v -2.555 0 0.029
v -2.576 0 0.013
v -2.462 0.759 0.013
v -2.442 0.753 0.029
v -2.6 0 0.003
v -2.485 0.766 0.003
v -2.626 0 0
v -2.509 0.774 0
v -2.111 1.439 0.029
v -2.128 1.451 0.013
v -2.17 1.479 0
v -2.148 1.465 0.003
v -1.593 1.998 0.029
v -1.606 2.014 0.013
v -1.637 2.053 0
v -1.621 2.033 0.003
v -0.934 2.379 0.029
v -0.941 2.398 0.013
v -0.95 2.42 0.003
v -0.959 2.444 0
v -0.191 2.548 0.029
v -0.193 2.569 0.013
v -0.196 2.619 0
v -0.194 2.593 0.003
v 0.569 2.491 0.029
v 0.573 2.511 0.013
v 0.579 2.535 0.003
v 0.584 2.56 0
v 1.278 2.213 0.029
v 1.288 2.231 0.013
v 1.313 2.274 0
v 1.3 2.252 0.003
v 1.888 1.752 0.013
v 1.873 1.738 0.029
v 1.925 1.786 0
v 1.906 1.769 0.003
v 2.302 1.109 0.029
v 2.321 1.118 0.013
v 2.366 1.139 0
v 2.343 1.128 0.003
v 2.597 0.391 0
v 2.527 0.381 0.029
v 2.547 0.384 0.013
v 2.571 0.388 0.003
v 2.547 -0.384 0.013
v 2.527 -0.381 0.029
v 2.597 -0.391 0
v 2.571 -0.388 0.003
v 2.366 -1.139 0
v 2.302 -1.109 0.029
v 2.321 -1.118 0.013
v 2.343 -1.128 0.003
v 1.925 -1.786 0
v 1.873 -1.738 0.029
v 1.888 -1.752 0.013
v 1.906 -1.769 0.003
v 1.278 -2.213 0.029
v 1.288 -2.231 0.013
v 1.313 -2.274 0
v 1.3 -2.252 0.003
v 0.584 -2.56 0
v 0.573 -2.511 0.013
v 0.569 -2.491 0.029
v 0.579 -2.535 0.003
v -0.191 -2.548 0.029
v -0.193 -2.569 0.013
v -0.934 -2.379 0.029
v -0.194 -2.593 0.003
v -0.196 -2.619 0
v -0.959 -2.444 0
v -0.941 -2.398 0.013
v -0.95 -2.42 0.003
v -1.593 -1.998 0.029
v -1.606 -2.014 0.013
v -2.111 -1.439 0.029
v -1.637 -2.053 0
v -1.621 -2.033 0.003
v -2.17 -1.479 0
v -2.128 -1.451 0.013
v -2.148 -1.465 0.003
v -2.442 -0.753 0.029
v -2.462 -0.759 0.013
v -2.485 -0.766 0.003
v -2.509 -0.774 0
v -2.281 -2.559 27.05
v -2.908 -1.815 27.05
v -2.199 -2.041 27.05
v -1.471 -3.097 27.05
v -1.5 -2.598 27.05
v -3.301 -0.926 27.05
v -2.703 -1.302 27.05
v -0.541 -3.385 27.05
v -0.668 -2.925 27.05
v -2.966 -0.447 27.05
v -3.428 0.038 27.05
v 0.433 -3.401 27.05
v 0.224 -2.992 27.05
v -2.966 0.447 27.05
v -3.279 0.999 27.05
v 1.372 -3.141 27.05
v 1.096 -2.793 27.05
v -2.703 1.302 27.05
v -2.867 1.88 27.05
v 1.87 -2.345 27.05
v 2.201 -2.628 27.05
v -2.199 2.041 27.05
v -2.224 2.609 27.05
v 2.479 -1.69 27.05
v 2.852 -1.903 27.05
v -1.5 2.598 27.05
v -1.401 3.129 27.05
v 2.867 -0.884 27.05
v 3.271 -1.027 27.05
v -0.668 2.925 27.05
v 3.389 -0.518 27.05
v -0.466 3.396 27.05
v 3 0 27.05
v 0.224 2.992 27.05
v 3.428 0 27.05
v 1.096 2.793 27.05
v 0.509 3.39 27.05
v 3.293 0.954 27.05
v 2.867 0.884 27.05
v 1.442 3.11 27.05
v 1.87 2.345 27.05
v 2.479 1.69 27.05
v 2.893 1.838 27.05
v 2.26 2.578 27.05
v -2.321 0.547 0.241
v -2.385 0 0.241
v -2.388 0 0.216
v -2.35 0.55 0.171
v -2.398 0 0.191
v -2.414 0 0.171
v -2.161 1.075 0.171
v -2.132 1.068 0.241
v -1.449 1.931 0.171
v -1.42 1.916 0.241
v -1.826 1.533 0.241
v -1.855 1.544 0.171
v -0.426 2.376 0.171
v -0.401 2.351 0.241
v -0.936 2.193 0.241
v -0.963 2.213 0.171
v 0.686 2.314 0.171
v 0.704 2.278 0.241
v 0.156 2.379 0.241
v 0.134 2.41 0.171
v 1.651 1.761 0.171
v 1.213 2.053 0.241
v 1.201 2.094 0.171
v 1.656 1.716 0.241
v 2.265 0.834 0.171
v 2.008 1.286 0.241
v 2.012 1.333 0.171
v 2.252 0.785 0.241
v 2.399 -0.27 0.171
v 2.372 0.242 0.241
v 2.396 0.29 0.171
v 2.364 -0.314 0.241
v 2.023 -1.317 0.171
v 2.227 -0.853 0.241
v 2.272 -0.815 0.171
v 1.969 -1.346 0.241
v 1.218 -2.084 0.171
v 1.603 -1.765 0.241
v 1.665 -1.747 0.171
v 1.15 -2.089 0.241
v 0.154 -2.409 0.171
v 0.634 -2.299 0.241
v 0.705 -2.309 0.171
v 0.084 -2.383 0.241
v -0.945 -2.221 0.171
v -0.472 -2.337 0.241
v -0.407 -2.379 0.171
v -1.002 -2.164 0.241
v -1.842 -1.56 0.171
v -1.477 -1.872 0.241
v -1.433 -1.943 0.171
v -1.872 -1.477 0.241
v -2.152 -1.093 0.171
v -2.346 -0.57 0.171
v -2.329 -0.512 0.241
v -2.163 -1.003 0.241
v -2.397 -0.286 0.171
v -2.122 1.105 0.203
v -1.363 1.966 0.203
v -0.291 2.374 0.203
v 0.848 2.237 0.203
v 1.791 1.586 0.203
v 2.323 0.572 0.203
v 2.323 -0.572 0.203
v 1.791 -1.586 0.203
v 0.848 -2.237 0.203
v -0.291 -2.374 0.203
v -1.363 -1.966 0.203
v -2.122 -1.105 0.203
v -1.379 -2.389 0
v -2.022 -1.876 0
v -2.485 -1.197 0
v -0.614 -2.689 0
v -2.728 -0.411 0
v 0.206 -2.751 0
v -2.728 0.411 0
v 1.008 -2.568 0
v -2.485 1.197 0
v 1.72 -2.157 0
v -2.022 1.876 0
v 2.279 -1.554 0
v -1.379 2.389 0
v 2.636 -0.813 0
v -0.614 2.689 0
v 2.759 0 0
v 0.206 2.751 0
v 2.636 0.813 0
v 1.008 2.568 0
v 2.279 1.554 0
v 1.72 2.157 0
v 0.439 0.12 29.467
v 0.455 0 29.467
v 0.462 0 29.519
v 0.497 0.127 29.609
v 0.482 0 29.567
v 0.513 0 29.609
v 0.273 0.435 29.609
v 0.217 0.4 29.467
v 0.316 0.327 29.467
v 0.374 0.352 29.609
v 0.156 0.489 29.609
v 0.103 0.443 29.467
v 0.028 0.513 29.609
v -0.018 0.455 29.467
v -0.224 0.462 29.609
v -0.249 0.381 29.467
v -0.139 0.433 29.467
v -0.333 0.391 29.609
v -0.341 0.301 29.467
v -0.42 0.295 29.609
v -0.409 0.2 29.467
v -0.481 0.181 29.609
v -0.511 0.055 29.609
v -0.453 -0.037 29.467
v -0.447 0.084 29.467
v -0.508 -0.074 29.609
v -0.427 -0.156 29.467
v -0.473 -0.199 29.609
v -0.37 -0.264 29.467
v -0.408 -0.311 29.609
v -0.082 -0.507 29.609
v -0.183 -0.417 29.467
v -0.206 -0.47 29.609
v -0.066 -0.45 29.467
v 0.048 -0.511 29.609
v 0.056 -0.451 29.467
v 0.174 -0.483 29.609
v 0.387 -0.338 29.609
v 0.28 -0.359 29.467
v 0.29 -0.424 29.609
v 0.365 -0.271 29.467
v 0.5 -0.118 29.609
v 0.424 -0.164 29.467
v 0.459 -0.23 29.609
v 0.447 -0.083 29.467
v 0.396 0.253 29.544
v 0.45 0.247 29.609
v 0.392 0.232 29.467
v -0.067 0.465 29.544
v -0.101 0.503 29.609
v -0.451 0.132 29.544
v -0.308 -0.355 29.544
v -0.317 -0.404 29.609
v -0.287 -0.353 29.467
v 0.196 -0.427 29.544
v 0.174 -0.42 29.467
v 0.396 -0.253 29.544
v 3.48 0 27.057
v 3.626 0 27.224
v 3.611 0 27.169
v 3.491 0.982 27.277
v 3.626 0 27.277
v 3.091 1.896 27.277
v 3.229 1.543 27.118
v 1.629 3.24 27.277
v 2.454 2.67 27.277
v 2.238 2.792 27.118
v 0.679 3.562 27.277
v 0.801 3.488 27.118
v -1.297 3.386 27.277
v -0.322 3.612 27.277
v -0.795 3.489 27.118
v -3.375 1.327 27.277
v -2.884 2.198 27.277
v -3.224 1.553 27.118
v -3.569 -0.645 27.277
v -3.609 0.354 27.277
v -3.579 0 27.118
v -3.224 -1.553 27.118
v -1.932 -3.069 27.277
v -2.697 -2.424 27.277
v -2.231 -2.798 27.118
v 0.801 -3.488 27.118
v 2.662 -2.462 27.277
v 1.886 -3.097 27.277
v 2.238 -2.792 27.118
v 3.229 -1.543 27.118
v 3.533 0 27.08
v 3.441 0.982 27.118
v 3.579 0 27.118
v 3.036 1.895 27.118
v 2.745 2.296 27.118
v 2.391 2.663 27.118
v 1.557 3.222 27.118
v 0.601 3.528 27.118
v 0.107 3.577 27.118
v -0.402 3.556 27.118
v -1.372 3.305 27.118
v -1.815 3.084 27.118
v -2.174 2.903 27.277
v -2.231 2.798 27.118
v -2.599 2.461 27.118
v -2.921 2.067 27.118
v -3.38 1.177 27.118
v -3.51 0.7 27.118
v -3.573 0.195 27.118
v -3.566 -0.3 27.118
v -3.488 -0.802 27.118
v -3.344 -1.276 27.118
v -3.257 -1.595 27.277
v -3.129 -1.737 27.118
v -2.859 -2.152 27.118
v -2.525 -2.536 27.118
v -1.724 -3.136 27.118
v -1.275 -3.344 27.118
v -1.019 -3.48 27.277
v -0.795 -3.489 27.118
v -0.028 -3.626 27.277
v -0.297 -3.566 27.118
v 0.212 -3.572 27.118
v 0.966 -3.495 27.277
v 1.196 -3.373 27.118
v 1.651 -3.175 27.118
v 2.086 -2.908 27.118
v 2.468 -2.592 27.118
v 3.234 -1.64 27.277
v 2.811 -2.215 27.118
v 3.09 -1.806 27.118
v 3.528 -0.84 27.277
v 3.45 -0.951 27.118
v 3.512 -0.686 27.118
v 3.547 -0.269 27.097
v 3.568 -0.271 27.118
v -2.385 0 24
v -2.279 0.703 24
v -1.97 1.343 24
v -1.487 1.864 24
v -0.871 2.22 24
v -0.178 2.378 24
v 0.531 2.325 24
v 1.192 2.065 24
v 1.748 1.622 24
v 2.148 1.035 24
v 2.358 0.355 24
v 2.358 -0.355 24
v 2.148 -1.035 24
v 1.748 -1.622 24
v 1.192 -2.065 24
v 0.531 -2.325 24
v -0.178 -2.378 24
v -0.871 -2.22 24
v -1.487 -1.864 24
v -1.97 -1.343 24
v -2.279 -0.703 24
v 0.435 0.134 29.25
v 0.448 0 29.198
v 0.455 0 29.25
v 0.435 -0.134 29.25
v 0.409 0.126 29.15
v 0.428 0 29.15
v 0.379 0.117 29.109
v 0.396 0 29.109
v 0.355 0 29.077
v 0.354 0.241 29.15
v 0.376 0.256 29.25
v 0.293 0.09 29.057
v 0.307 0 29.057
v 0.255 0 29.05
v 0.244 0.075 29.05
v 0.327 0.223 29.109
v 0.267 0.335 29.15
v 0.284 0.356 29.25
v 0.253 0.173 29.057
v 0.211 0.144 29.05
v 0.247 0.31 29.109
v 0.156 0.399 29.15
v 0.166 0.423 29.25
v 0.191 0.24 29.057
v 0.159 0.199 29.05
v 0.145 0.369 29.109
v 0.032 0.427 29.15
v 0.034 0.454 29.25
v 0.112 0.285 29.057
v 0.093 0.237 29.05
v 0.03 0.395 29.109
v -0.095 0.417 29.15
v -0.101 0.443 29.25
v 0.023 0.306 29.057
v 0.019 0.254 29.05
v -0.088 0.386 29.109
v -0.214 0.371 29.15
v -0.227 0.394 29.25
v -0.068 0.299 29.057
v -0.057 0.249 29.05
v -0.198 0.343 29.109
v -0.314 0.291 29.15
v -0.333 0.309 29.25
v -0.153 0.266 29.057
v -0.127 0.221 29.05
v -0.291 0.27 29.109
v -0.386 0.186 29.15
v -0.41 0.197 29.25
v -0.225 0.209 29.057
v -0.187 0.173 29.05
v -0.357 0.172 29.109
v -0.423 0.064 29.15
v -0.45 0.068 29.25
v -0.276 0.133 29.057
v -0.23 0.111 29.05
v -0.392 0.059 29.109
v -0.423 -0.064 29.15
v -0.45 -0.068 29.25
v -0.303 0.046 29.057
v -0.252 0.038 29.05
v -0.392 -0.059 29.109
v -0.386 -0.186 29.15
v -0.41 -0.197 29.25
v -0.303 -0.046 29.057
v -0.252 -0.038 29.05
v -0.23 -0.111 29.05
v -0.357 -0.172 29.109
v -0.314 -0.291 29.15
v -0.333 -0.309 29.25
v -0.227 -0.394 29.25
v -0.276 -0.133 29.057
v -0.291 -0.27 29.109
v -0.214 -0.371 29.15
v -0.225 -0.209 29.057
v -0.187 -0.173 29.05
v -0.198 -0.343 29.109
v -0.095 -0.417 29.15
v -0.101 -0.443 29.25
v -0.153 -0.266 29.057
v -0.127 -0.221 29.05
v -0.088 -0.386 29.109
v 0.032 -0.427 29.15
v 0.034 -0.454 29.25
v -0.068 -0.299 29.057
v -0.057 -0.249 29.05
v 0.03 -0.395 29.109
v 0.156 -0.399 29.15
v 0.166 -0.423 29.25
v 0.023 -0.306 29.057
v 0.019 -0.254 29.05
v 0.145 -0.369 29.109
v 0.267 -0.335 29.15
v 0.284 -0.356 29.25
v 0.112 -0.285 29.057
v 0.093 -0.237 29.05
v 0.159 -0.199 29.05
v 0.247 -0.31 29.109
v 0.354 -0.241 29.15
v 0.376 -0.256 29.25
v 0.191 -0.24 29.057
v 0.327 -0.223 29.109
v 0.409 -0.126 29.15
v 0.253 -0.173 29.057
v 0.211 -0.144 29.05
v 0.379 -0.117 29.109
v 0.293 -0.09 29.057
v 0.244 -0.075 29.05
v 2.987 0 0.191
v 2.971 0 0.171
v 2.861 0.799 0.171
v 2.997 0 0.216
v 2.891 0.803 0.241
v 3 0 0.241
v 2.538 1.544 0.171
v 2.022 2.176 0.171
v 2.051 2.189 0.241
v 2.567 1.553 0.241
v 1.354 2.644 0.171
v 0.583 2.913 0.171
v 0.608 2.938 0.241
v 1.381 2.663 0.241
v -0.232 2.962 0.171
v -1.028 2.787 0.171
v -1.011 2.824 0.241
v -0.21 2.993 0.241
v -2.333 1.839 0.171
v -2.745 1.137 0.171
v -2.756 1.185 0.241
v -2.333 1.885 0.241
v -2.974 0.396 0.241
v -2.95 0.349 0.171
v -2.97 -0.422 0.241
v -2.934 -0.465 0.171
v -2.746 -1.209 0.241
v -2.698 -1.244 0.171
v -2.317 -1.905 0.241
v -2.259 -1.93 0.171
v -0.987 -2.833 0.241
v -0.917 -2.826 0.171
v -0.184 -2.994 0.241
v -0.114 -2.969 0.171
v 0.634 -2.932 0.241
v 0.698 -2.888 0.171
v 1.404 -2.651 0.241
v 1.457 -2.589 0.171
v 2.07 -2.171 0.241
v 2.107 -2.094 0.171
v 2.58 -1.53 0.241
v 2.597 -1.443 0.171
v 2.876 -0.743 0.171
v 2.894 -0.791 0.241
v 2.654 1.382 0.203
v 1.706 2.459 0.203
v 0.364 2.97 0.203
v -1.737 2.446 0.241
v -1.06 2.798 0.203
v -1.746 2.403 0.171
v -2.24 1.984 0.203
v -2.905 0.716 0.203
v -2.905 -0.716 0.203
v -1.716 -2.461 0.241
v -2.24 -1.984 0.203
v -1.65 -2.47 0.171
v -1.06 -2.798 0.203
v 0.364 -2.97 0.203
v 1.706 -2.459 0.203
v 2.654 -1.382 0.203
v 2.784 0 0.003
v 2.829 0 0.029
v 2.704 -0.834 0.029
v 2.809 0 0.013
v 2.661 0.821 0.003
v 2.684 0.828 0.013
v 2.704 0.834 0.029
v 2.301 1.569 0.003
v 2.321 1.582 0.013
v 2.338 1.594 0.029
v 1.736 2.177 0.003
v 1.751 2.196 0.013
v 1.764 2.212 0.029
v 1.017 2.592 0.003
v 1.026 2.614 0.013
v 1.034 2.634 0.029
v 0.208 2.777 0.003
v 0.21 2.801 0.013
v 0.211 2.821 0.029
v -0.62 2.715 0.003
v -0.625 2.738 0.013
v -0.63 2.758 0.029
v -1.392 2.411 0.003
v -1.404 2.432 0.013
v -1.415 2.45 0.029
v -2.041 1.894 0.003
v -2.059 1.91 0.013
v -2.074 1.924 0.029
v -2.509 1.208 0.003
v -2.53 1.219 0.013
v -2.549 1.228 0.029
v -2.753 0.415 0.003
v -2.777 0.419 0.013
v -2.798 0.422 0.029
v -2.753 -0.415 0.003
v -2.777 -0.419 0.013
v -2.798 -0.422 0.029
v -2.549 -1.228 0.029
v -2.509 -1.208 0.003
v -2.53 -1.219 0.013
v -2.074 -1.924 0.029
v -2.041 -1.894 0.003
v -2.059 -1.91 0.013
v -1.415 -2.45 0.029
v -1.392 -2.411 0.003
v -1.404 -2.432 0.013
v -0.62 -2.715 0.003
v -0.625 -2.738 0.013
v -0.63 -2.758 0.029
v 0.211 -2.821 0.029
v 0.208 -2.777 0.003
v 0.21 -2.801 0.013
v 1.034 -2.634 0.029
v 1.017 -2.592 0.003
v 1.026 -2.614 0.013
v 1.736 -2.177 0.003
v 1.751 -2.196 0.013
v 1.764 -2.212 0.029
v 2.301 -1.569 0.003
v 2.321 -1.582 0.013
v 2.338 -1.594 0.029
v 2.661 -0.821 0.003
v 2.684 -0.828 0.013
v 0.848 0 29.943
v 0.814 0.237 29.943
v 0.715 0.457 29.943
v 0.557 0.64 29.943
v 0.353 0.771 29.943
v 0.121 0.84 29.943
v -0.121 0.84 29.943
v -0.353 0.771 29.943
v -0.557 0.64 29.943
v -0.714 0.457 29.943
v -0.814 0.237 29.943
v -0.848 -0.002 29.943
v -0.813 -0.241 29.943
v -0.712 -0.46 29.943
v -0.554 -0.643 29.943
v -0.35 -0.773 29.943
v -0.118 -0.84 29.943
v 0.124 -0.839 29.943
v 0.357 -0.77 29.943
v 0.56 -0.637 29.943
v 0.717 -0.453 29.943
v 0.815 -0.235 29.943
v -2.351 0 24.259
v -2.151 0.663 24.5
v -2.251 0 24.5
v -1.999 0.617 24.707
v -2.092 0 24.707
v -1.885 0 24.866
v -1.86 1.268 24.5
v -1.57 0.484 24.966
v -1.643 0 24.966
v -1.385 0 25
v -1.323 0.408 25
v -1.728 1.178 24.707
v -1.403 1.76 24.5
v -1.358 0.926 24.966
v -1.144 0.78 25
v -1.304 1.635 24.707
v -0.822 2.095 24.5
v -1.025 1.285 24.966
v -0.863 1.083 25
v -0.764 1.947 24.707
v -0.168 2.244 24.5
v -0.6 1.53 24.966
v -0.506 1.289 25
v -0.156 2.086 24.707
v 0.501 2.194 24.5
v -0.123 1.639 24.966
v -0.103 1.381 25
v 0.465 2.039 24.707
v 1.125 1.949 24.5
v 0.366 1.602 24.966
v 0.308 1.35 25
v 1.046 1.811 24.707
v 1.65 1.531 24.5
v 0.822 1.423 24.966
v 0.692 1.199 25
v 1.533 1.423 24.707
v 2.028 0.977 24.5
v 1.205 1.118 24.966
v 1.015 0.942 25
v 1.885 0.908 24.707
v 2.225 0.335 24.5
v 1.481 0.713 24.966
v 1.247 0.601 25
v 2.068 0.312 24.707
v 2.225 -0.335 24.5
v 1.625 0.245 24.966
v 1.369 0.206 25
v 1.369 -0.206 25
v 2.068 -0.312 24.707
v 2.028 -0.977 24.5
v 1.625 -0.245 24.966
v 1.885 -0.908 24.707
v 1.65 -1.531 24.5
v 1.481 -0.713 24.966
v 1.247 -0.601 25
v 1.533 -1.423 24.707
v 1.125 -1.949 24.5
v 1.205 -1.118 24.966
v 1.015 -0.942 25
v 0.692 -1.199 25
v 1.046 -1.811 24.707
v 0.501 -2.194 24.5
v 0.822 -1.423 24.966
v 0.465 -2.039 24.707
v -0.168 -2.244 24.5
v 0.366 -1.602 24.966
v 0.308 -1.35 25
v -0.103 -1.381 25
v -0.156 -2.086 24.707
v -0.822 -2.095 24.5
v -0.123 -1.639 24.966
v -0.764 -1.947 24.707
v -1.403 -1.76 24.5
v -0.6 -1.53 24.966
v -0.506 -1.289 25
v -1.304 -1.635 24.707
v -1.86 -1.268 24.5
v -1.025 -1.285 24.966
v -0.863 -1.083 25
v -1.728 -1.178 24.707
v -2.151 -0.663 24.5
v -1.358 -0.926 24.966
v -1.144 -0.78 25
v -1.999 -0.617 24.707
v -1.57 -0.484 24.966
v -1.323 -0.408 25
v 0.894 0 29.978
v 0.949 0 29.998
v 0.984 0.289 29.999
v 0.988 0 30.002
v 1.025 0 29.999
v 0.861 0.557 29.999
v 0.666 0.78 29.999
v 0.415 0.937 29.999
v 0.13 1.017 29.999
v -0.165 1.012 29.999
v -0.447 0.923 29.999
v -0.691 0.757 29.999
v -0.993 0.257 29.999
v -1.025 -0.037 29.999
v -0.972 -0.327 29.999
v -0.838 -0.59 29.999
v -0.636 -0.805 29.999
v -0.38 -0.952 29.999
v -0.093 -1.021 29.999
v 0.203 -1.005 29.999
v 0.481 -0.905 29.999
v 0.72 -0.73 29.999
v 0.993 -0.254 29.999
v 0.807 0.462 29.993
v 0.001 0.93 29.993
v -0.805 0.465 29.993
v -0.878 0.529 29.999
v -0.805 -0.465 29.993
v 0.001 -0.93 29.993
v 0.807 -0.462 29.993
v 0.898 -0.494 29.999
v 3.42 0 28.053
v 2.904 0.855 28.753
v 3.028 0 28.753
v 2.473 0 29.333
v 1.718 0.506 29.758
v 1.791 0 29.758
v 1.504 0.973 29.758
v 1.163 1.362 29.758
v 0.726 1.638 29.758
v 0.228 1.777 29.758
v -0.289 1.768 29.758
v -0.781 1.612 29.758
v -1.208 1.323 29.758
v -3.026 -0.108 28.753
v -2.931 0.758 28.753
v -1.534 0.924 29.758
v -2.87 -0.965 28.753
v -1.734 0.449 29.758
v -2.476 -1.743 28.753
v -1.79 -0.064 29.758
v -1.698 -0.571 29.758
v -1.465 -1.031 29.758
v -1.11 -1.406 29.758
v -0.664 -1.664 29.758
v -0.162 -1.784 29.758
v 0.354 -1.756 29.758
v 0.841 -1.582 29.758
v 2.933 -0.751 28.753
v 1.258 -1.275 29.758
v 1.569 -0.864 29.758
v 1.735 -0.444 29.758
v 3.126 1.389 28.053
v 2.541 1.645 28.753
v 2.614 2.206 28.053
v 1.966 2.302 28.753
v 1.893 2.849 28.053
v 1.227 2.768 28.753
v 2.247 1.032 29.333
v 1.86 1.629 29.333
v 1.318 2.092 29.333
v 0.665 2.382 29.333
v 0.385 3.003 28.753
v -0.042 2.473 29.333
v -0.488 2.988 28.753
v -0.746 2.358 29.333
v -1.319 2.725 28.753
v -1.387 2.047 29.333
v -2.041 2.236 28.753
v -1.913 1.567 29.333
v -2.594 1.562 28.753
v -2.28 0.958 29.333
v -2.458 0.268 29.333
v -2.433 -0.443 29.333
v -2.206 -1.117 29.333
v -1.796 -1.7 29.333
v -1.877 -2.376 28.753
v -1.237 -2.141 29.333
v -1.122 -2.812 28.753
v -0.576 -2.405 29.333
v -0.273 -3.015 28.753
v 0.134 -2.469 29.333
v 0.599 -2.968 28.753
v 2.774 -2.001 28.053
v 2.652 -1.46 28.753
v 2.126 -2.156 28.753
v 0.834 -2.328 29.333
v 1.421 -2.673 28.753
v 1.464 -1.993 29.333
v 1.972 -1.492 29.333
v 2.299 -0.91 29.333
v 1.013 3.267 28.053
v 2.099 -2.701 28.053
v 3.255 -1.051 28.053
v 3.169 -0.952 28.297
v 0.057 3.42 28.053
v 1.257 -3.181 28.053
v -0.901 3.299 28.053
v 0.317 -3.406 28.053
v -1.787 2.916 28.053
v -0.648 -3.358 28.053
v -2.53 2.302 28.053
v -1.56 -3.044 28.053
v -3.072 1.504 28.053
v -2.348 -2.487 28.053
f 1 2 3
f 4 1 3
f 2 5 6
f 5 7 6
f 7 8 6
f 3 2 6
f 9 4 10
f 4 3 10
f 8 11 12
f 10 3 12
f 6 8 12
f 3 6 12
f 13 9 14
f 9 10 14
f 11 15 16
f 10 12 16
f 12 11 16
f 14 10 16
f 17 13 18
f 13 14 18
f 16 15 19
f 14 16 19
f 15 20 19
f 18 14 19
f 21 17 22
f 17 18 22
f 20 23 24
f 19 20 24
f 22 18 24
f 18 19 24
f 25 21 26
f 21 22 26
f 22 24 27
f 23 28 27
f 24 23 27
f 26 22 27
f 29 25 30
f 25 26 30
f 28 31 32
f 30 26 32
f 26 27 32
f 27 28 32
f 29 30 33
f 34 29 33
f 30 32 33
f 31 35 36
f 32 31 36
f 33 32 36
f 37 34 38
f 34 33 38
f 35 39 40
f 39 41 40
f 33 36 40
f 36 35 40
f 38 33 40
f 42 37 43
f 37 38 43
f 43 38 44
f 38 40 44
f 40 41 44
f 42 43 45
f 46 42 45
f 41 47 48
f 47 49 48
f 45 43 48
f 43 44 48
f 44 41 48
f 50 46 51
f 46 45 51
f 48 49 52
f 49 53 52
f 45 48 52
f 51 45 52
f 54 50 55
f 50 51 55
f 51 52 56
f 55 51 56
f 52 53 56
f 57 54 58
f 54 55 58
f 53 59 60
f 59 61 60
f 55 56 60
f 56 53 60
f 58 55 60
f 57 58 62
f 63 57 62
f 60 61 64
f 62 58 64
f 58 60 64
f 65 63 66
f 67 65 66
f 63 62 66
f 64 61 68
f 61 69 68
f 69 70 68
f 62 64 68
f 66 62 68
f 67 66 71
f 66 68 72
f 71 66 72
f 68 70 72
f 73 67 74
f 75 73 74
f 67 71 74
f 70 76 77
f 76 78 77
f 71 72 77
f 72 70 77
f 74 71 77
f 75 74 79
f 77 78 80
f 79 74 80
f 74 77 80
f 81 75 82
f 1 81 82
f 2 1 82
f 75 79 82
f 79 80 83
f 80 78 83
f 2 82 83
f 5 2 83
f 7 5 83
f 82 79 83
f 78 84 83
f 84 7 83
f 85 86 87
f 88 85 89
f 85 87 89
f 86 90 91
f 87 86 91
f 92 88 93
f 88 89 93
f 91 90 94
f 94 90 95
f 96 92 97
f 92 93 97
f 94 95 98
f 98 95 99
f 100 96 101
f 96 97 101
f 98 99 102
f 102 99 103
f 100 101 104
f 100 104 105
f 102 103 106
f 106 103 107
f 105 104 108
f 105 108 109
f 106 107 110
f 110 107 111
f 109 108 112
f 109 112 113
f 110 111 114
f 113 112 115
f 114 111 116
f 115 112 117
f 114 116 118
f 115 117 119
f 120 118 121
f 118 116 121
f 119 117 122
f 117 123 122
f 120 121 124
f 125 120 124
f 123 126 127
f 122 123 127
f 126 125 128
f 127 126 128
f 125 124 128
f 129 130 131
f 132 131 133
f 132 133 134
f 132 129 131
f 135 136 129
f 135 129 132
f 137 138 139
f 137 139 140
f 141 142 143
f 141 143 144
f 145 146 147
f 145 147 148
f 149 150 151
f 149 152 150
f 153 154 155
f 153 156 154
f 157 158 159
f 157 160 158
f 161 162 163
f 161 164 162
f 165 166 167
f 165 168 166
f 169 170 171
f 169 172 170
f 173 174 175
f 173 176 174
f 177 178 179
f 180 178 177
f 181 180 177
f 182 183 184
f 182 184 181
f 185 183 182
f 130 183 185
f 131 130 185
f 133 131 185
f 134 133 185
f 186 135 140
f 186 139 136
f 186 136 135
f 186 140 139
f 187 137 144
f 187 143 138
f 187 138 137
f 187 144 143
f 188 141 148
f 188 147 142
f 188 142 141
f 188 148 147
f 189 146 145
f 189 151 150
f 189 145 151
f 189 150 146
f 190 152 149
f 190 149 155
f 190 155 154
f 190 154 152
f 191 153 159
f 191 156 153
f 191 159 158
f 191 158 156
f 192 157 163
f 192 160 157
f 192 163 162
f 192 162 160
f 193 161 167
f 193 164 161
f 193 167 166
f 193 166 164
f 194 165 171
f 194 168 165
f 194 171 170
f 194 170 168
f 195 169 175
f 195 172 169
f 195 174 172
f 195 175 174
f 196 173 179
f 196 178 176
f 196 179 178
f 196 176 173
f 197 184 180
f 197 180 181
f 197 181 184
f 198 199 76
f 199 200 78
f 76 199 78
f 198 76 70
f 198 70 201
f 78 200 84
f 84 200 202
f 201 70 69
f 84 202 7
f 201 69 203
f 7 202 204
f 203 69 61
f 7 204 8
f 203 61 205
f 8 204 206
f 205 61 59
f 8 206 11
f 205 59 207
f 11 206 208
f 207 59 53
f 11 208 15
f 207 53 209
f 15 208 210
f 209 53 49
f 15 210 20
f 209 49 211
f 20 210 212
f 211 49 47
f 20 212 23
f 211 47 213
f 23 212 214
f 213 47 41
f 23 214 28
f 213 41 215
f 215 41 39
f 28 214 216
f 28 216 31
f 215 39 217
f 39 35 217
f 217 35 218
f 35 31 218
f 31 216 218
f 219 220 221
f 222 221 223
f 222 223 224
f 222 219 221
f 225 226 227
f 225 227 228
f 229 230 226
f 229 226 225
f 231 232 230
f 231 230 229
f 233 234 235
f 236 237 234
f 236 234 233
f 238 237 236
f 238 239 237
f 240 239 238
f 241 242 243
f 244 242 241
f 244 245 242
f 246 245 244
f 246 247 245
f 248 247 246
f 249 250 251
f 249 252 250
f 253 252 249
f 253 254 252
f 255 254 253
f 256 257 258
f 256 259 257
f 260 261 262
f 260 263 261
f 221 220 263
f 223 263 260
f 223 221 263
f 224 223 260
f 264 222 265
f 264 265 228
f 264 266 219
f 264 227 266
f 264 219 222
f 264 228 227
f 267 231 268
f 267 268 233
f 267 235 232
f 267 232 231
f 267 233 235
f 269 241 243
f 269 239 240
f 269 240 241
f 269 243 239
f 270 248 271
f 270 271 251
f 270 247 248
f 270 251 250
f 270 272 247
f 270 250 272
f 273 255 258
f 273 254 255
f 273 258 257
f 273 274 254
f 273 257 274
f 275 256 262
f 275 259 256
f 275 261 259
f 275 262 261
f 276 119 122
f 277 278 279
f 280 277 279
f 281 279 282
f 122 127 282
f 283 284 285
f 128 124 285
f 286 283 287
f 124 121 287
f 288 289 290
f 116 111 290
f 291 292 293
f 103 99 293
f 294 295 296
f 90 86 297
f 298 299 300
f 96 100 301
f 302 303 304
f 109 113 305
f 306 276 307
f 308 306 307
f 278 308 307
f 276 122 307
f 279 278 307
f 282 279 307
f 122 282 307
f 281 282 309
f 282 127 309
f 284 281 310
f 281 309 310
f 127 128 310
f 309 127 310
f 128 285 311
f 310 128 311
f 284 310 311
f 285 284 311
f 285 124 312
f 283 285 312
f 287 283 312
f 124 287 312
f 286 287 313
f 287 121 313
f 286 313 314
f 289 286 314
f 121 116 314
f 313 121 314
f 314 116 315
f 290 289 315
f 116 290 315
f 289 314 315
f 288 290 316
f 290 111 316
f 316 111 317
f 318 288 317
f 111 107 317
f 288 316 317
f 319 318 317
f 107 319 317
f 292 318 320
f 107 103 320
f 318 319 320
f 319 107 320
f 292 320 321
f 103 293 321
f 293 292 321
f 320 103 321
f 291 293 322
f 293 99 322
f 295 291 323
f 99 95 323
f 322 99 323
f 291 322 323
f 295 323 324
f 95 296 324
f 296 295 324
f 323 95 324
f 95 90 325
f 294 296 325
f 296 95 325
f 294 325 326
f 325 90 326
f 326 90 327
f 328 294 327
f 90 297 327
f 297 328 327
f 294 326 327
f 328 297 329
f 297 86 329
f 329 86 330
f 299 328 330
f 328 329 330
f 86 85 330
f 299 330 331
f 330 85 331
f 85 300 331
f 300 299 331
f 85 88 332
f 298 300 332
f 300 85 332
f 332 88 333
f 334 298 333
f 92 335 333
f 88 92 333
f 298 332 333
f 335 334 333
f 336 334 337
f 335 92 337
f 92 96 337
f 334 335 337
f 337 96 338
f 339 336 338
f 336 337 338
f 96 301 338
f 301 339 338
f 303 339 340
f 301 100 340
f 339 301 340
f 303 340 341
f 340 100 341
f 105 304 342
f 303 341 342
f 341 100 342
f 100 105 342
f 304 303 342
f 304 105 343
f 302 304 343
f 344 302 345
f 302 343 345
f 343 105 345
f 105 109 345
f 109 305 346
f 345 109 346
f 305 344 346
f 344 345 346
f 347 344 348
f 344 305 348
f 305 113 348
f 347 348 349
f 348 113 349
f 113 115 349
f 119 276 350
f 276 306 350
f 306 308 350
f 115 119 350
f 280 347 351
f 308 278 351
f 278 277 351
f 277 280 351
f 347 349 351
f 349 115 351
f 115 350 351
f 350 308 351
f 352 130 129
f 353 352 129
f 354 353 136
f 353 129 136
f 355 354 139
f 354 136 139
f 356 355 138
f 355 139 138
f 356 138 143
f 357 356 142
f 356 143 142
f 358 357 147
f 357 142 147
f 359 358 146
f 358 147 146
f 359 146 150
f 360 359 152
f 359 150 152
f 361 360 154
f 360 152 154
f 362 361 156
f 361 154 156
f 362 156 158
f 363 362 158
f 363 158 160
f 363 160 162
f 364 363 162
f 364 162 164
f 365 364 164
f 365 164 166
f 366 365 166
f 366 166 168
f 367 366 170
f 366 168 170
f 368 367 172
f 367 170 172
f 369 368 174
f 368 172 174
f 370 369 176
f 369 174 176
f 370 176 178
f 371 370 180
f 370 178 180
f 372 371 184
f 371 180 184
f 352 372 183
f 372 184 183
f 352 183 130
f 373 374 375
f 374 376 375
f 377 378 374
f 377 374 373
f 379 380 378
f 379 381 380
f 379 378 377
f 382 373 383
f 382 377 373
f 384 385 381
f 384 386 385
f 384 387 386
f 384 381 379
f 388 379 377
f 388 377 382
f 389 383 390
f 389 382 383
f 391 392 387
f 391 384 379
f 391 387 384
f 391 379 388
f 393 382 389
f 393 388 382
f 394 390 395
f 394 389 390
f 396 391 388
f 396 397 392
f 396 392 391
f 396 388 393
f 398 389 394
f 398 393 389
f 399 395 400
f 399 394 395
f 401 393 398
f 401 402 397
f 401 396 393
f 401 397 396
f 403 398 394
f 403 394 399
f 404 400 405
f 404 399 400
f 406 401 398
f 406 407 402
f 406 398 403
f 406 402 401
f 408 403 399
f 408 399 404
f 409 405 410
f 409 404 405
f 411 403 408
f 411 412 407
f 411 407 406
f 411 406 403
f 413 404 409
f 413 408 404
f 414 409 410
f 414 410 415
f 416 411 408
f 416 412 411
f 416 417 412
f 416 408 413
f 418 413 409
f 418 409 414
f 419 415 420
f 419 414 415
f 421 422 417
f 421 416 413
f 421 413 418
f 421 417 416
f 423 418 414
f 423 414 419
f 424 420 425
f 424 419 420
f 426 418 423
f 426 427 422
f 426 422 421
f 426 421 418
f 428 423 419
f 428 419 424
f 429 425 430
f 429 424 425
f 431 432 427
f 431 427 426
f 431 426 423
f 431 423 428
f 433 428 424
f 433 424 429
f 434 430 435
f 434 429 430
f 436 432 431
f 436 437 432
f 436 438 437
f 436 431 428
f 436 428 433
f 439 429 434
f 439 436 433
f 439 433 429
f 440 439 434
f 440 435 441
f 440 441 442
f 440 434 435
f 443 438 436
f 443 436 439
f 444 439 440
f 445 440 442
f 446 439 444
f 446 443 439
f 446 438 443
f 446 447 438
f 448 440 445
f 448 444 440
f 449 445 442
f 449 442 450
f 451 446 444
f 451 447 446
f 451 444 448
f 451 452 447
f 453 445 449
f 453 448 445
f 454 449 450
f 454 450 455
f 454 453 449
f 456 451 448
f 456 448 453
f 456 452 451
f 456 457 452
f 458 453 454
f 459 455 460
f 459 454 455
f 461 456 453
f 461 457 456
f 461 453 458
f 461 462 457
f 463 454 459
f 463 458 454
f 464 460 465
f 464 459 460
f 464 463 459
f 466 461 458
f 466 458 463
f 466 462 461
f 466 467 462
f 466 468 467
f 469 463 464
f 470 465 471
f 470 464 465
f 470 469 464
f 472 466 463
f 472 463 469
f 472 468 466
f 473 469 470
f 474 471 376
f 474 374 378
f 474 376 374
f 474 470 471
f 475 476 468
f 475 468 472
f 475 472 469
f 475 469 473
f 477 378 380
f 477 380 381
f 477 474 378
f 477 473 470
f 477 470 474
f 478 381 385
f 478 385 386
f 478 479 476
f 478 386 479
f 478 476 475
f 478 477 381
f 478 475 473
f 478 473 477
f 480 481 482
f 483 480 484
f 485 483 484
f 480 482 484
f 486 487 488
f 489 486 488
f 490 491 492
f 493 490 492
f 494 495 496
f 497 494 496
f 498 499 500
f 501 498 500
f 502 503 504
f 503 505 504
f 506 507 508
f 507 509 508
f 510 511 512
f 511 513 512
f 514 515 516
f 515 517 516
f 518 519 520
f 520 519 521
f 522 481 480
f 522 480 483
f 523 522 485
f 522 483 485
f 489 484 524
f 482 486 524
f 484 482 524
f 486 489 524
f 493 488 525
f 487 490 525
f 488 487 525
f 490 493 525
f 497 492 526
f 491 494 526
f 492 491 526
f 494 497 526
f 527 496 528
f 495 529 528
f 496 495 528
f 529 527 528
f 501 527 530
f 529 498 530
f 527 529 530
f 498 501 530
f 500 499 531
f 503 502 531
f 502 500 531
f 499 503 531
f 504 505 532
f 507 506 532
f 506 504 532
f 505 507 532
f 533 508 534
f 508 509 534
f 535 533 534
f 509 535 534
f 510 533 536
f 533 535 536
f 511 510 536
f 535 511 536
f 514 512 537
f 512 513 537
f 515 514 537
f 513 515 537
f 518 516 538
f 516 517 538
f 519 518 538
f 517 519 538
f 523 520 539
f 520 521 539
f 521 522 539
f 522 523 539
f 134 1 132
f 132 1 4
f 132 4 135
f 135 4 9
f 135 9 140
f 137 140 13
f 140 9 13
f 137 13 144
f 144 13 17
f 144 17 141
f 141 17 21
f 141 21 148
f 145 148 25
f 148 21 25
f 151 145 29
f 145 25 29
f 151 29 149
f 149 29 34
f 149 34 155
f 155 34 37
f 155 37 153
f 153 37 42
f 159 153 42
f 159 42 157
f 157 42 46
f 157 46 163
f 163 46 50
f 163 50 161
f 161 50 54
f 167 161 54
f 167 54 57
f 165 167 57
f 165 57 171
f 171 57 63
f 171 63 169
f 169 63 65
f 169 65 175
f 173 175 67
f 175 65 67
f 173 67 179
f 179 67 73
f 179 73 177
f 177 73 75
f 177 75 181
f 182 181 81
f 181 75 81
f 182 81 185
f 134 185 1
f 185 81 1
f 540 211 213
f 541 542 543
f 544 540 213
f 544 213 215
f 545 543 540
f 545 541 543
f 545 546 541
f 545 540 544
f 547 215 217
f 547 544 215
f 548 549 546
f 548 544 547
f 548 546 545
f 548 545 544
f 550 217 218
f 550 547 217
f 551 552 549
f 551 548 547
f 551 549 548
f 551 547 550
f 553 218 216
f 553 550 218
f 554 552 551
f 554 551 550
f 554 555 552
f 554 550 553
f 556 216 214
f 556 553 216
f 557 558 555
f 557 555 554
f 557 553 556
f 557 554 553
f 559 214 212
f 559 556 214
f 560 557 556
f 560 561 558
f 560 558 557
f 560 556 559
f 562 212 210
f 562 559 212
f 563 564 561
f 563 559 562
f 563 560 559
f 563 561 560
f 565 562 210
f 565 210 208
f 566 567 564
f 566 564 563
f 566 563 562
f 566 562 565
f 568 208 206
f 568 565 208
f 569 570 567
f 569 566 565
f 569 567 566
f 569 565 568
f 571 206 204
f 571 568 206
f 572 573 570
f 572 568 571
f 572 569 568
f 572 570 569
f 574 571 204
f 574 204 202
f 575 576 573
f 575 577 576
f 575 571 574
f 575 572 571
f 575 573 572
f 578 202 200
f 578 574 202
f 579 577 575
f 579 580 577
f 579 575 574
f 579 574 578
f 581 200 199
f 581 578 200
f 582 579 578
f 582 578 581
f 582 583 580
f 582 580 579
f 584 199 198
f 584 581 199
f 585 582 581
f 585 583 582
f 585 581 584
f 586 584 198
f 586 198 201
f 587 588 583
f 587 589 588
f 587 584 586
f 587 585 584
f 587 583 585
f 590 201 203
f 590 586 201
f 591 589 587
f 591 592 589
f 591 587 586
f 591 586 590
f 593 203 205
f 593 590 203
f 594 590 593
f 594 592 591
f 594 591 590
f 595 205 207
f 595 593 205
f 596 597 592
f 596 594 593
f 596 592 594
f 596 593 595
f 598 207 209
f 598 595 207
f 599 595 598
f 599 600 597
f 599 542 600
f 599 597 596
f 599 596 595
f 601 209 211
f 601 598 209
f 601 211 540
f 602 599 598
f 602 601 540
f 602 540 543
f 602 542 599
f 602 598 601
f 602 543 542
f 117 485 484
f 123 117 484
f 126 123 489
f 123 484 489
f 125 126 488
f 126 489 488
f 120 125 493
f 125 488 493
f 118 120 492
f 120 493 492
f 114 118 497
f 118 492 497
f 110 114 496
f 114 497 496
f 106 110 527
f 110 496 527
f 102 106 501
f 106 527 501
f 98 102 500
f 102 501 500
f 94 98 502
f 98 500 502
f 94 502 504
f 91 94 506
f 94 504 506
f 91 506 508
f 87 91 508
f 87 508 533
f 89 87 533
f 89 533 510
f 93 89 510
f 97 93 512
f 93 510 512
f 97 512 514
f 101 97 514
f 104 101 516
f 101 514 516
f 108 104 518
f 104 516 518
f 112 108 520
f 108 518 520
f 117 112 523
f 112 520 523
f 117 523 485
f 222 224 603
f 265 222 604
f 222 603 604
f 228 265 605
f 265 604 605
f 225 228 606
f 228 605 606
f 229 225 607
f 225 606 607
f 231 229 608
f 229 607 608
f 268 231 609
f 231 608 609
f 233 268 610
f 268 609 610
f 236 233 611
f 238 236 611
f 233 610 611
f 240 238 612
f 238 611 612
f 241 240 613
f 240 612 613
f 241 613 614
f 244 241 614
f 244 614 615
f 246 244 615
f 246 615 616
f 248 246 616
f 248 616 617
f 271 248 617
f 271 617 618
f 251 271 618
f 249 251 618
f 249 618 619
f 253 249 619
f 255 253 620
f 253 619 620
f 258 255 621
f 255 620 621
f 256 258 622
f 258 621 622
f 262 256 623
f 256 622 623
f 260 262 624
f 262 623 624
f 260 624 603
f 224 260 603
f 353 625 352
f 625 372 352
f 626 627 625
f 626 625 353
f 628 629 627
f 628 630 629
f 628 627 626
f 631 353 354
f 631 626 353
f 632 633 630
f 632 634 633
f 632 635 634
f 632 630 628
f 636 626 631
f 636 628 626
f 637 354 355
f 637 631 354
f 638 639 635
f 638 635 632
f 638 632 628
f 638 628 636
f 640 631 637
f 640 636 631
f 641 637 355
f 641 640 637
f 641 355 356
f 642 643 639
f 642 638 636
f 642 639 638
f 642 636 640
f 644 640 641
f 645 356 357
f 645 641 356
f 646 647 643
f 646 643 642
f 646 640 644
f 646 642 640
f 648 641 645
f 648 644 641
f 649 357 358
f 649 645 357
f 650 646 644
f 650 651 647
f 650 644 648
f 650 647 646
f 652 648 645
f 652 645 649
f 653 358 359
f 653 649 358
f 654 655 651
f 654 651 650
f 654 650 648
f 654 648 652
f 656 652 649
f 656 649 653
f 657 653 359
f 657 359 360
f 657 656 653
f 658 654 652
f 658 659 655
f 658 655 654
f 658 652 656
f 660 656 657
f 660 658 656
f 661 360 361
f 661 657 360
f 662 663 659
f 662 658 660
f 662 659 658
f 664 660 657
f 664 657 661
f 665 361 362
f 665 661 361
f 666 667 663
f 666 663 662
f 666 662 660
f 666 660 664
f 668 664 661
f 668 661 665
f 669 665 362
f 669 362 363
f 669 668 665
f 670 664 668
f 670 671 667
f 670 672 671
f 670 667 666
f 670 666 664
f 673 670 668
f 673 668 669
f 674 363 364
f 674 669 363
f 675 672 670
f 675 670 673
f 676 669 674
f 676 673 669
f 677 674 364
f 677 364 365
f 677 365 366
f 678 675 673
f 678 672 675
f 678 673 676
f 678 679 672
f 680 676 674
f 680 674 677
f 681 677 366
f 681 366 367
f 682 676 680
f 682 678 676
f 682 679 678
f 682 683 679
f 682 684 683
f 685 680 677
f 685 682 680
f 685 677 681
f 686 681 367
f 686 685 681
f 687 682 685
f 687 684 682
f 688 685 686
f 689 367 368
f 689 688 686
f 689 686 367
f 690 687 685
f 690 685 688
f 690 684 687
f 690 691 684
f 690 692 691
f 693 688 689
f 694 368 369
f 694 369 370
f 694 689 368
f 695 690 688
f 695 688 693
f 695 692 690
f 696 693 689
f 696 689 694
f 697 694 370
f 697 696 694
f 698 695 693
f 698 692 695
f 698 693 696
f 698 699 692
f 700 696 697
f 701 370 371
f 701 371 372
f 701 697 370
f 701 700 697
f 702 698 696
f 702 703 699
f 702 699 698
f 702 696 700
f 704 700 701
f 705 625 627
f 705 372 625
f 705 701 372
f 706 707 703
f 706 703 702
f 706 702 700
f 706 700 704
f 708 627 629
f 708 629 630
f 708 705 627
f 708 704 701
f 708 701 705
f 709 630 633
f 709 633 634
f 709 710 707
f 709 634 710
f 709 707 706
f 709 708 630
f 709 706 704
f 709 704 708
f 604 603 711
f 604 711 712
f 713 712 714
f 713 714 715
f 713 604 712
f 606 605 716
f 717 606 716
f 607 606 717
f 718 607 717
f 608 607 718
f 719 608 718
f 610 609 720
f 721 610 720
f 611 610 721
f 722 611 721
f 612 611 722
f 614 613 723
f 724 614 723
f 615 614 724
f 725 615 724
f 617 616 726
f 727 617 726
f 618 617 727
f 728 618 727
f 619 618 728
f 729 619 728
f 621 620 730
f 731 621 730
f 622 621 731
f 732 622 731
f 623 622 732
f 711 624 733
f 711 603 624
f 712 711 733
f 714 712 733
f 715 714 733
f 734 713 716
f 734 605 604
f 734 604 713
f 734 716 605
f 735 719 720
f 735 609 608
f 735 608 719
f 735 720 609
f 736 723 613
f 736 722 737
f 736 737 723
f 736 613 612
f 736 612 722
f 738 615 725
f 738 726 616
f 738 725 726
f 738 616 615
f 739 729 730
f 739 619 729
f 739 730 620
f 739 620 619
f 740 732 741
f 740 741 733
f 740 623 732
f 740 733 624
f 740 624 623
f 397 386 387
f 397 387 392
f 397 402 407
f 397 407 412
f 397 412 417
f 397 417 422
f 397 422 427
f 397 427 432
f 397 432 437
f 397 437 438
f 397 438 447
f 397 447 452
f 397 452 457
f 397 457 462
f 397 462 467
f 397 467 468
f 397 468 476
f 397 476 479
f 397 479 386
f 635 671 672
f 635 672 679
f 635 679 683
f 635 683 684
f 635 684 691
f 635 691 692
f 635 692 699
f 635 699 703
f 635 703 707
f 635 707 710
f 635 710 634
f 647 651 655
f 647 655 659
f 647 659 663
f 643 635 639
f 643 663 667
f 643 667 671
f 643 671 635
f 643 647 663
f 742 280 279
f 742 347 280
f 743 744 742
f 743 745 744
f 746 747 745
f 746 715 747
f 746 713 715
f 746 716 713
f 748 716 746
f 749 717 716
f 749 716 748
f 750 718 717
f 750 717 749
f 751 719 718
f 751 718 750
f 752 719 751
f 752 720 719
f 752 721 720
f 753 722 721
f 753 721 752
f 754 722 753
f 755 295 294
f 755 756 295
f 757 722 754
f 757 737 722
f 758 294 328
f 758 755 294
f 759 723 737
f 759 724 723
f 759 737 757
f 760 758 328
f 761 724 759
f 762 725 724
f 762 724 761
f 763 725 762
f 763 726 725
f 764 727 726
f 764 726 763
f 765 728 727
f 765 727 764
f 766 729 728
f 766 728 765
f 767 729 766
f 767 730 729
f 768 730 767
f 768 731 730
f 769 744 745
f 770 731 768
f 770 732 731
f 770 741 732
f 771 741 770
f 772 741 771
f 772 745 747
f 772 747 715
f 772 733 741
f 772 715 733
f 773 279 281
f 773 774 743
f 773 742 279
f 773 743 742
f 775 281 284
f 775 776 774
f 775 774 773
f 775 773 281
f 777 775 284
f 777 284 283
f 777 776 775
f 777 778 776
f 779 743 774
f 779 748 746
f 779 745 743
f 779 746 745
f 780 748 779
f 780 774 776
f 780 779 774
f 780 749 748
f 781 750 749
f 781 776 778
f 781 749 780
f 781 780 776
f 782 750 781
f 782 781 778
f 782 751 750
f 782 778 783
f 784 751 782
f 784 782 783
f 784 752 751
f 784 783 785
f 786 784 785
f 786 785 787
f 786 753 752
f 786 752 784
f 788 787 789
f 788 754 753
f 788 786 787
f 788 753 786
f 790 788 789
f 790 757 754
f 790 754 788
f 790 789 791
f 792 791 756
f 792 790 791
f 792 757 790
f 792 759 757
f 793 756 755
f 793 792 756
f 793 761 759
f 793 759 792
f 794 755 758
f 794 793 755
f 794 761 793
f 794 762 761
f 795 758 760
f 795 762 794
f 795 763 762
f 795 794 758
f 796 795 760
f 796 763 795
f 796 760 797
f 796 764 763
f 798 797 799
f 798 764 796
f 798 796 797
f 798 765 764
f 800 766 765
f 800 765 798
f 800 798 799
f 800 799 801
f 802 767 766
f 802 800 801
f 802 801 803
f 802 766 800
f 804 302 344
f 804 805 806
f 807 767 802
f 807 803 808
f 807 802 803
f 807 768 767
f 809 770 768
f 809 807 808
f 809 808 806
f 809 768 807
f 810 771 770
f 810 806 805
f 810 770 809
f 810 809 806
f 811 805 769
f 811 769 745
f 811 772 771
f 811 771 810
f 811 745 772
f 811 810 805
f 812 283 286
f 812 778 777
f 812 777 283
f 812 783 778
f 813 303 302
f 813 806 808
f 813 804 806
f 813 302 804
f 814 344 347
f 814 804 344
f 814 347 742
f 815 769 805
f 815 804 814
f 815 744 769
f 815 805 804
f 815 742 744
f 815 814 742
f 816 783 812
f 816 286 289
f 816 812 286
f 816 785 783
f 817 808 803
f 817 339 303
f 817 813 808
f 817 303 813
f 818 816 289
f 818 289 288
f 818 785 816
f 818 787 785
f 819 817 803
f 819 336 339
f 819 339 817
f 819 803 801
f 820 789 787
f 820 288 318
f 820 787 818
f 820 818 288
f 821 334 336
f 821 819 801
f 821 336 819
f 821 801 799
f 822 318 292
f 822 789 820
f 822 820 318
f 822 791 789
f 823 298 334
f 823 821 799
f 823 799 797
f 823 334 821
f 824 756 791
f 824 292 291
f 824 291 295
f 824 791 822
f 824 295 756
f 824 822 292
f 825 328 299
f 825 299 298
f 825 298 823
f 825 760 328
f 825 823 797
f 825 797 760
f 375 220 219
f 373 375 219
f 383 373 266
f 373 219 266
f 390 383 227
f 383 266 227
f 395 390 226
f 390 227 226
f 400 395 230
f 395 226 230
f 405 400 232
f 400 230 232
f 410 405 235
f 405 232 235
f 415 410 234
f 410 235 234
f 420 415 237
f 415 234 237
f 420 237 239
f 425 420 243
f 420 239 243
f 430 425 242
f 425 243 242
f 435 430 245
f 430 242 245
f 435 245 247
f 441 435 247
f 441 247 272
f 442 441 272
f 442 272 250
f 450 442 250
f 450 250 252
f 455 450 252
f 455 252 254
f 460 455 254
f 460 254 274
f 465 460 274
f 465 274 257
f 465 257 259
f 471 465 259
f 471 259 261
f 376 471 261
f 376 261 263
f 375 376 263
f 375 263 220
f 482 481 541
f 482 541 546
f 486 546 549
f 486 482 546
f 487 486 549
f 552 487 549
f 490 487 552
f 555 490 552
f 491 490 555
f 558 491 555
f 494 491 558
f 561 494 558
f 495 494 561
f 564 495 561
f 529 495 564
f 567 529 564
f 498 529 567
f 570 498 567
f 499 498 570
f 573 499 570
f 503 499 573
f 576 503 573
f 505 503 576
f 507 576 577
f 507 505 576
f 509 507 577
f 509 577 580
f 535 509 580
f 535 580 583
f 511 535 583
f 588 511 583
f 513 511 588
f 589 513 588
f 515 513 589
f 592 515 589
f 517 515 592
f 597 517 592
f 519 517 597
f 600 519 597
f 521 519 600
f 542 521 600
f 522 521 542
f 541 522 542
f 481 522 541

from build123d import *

# Parameters (mm, degrees)
SKETCH1_R           = 3
BOSS_EXTRUDE1_DEPTH = 27.05
SKETCH2_R           = 3.648644993
BOSS_EXTRUDE2_DEPTH = 3
FILLET1_R           = 3.2
FILLET2_R           = 0.2
SKETCH3_R           = 0.454901109
CUT_EXTRUDE1_DEPTH  = 1
FILLET3_R           = 0.2
CHAMFER1_SIZE       = 0.5
FILLET4_R           = 0.2
SKETCH4_R           = 2.384579771
CUT_EXTRUDE2_DEPTH  = 25
FILLET5_R           = 1
CHAMFER2_SIZE       = 0.2
FILLET6_R           = 0.1


with BuildPart() as part:
    # Sketch1 → Boss-Extrude1 (new body)
    with BuildSketch(Plane.XY):
        Circle(SKETCH1_R)
    extrude(amount=BOSS_EXTRUDE1_DEPTH)

    # Sketch2 → Boss-Extrude2 (add)
    with BuildSketch(Plane.XY.offset(27.05)):
        Circle(SKETCH2_R)
    extrude(amount=BOSS_EXTRUDE2_DEPTH)

    # Fillet1
    # the kernel refuses this fillet: 3.2 mm, written as the material it takes off along each edge
    with BuildSketch(Plane(origin=(0, 0, 30.05), x_dir=(1, 0, 0), z_dir=(0, -1, 0))) as fillet1_piece_1:
        with BuildLine():
            CenterArc((0.454901109, -3.2), FILLET1_R, 3.583321698, 86.416678302)
            Line((0.454901109, 0), (0.454901109, 0.064))
            Line((0.454901109, 0.064), (3.648644993, 0.064))
            Line((3.648644993, 0.064), (3.712644993, 0))
            ThreePointArc((3.712644993, 0), (3.712644993, -1.5), (3.712519871, -2.996))
            Line((3.712519871, -2.996), (3.648644993, -3))
        make_face()
    revolve(axis=Axis((0, 0, 30.05), (0, 0, 1)), mode=Mode.SUBTRACT)

    # Fillet2
    fillet2_edges = [part.edges().sort_by_distance(p)[0] for p in [
        (-3.648644993, 0, 27.05),
    ]]
    fillet(fillet2_edges, radius=FILLET2_R)

    # Sketch3 → Cut-Extrude1 (cut)
    with BuildSketch(Plane.XY.offset(30.05)):
        Circle(SKETCH3_R)
    extrude(amount=-CUT_EXTRUDE1_DEPTH, mode=Mode.SUBTRACT)

    # Fillet3
    fillet3_edges = [part.edges().sort_by_distance(p)[0] for p in [
        (-0.454901109, 0, 29.05),
    ]]
    fillet(fillet3_edges, radius=FILLET3_R)

    # Chamfer1
    # the kernel refuses this chamfer: 0.5 mm, written as the material it takes off along each edge
    with BuildSketch(Plane(origin=(0, 0, 30.05), x_dir=(1, 0, 0), z_dir=(0, -1, 0))) as chamfer1_piece_1:
        with BuildLine():
            Line((0.454901109, -CHAMFER1_SIZE), (0.920803088, -0.03409802))
            ThreePointArc((0.920803088, -0.03409802), (0.69499526, -0.009019775), (0.454901109, 0))
            Line((0.454901109, 0), (0.454901109, -CHAMFER1_SIZE))
        make_face()
    revolve(axis=Axis((0, 0, 30.05), (0, 0, 1)), mode=Mode.SUBTRACT)

    # Fillet4
    fillet4_edges = [part.edges().sort_by_distance(p)[0] for p in [
        (-0.454901109, 0, 29.55),
        (-0.920803088, 0, 30.01590198),
    ]]
    fillet(fillet4_edges, radius=FILLET4_R)

    # Sketch4 → Cut-Extrude2 (cut)
    with BuildSketch(Plane(origin=(0, 0, 0), x_dir=(-1, 0, 0), z_dir=(0, 0, -1))):
        Circle(SKETCH4_R)
    extrude(amount=-CUT_EXTRUDE2_DEPTH, mode=Mode.SUBTRACT)

    # Fillet5
    fillet5_edges = [part.edges().sort_by_distance(p)[0] for p in [
        (2.384579771, 0, 25),
    ]]
    fillet(fillet5_edges, radius=FILLET5_R)

    # Chamfer2
    chamfer2_edges = [part.edges().sort_by_distance(p)[0] for p in [
        (2.384579771, 0, 0),
        (-3, 0, 0),
    ]]
    chamfer(chamfer2_edges, length=CHAMFER2_SIZE)

    # Fillet6
    fillet6_edges = [part.edges().sort_by_distance(p)[0] for p in [
        (-3, 0, 0.2),
        (2.584579771, 0, 0),
        (-2.8, 0, 0),
        (2.384579771, 0, 0.2),
    ]]
    fillet(fillet6_edges, radius=FILLET6_R)


solid = part.part
